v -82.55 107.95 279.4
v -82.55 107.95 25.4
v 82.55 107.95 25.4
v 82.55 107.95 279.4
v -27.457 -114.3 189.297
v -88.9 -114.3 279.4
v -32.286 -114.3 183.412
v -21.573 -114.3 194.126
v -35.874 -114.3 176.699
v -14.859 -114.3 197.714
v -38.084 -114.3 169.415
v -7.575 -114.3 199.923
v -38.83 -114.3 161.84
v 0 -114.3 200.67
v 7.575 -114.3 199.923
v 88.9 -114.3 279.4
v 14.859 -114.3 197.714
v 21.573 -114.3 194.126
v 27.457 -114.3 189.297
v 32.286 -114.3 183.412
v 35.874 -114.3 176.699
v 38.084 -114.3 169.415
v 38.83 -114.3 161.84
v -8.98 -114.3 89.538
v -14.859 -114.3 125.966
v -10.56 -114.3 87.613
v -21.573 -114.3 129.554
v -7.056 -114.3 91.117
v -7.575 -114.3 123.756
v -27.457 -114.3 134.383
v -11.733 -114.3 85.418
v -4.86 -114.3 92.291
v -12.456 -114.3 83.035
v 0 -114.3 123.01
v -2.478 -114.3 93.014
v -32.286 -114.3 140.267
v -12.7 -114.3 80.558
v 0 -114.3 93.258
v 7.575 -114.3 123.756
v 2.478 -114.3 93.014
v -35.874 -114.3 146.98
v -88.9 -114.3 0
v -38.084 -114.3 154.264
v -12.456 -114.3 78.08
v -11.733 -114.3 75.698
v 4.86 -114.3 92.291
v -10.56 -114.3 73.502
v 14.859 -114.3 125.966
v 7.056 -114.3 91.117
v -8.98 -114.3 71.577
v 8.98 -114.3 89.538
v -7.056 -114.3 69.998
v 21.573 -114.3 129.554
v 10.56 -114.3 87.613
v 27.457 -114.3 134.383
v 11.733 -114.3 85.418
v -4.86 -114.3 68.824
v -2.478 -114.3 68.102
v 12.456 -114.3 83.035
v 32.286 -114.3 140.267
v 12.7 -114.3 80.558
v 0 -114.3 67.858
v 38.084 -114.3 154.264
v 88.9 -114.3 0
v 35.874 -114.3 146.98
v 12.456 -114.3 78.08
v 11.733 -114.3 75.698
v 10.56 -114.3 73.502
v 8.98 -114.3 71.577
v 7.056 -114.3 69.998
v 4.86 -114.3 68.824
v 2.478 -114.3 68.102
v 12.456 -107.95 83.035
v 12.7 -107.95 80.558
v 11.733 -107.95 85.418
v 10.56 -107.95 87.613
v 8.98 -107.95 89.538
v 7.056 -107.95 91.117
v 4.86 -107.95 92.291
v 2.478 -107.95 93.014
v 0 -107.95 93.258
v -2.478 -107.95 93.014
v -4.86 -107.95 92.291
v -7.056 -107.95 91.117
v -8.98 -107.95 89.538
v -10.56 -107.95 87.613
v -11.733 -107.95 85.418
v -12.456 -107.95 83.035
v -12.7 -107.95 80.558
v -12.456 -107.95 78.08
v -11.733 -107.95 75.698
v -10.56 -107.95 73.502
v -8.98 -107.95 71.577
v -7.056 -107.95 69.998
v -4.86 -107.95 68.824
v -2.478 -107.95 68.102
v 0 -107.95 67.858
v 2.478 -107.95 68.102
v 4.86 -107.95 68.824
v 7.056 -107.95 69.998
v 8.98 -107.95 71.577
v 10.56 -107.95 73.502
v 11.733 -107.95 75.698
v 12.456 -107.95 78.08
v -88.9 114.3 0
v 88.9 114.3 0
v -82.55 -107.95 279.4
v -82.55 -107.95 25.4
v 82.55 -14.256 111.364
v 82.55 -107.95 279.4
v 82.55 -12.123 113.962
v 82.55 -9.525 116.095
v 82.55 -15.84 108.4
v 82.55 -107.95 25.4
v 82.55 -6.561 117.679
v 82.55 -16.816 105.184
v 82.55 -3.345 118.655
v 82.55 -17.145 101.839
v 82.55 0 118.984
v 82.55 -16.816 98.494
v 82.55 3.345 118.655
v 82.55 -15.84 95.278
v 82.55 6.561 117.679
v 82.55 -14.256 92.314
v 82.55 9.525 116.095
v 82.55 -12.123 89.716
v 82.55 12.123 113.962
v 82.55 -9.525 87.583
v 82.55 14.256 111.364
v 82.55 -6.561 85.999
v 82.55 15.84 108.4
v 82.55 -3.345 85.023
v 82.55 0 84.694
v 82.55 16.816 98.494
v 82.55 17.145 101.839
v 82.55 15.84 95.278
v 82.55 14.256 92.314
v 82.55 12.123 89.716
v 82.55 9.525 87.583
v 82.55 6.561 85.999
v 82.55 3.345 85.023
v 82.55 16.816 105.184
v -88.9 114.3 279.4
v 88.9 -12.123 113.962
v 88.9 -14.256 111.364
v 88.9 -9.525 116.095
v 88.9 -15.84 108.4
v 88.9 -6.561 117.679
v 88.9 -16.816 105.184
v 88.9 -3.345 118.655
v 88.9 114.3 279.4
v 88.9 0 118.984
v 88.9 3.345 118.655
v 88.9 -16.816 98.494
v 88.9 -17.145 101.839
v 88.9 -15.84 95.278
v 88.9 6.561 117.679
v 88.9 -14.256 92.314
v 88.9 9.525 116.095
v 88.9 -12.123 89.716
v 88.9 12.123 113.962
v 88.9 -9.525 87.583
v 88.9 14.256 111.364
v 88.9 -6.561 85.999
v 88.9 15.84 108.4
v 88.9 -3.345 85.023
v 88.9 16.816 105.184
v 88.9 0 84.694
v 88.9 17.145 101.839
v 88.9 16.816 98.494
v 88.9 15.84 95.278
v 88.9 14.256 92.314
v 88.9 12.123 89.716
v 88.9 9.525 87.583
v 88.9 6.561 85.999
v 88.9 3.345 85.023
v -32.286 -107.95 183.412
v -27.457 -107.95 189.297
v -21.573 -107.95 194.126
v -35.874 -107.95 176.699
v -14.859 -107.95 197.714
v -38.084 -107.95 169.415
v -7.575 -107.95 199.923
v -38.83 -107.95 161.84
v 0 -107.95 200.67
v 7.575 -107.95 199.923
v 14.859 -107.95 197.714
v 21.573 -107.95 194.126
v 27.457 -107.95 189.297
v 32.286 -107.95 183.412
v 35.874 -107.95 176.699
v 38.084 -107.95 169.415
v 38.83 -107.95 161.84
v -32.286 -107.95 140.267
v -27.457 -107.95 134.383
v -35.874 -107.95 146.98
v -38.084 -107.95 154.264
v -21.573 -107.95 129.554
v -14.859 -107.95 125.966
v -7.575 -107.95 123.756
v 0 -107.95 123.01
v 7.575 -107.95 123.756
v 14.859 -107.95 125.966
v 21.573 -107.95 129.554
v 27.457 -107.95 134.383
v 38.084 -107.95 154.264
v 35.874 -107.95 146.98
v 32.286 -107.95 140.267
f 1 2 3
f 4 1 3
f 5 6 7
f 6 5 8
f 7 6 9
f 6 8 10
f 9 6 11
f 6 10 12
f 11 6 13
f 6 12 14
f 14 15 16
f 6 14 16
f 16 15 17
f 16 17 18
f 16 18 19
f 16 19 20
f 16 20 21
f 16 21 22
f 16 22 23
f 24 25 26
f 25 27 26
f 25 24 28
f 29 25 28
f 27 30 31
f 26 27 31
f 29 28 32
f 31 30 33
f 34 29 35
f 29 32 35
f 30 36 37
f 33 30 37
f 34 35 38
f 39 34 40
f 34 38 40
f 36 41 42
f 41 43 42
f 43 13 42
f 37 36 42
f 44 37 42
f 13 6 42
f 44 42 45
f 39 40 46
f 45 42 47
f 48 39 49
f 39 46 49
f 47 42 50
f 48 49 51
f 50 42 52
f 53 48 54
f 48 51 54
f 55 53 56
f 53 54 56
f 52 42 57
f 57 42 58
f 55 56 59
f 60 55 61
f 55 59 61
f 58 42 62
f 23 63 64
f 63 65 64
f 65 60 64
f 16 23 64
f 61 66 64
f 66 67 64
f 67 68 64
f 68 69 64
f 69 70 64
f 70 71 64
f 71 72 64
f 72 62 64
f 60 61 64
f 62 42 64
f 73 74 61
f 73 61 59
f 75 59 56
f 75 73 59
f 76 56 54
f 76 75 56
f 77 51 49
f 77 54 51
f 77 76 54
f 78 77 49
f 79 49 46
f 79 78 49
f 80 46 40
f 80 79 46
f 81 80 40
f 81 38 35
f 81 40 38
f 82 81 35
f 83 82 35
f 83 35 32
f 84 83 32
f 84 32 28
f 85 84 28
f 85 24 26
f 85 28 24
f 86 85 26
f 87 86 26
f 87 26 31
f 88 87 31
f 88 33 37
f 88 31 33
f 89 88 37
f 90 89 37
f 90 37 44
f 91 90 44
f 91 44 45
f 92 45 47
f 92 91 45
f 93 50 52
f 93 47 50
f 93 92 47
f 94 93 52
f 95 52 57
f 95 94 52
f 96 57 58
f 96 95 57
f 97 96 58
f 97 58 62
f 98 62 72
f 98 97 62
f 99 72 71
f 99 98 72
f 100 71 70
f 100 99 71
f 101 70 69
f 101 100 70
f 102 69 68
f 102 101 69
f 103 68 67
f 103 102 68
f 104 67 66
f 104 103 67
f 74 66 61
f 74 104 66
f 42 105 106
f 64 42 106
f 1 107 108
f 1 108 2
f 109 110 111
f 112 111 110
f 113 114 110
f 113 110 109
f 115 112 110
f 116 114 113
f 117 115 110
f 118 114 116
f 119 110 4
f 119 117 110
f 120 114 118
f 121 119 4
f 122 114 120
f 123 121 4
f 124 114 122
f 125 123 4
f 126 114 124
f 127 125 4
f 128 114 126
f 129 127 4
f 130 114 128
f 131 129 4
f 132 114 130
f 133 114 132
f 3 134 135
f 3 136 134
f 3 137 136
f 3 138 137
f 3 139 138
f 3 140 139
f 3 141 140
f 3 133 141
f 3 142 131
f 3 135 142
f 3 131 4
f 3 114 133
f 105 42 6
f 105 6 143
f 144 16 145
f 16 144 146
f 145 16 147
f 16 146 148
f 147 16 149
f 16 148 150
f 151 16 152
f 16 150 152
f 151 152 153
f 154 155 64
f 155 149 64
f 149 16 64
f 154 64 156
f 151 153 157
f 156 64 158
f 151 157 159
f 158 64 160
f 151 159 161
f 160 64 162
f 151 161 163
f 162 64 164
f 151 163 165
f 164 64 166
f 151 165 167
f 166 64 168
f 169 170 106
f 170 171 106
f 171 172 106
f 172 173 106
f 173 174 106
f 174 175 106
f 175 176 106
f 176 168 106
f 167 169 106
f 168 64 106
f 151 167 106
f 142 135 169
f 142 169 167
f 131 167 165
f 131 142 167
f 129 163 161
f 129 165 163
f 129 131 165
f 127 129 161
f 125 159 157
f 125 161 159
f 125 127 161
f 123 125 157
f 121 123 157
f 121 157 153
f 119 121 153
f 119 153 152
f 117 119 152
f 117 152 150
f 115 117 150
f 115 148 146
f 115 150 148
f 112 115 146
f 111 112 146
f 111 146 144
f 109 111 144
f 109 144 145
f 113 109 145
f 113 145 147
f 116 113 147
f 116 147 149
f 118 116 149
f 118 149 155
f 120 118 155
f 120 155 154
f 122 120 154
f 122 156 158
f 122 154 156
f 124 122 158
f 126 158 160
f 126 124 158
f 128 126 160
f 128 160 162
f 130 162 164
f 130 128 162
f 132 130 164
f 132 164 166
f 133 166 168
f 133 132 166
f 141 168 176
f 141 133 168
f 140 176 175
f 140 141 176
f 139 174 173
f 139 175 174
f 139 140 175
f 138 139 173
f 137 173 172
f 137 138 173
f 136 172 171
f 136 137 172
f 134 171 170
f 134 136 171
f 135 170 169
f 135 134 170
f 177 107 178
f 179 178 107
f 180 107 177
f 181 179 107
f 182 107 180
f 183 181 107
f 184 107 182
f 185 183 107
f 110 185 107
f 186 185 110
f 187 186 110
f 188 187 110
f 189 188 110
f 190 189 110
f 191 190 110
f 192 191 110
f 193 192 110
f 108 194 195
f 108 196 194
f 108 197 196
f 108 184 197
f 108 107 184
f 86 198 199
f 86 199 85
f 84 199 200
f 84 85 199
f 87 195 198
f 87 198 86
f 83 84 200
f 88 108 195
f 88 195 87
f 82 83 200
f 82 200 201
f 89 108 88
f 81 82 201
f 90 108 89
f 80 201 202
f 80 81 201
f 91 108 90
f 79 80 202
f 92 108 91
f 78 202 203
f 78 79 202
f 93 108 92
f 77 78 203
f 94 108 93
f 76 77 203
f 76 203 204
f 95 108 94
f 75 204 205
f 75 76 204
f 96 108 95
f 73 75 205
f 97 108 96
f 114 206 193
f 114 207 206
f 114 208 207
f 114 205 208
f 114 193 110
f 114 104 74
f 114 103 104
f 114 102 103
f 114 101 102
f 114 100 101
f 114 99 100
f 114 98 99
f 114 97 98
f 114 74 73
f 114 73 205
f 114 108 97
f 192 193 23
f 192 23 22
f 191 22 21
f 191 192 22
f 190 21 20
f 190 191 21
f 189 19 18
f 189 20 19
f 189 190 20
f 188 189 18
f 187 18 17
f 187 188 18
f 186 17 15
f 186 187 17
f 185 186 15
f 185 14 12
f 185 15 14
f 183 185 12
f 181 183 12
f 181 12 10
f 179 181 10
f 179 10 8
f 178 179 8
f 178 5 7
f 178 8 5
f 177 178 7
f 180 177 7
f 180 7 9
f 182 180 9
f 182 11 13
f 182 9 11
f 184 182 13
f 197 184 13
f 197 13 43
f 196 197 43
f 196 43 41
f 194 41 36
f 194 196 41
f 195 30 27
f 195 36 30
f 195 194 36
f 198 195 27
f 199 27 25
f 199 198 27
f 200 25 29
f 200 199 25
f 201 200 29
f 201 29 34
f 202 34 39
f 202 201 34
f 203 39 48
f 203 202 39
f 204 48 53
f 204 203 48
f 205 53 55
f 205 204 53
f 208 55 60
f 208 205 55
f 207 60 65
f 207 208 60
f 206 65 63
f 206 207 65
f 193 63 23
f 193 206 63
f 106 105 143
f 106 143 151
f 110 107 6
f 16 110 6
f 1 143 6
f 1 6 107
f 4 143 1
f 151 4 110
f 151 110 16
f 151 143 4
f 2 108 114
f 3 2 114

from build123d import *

# Parameters (mm, degrees)
F0_W     = 177.8
F0_H     = 228.6
F0_W_2   = 165.1
F0_H_2   = 215.9
F1_DEPTH = 279.4
F2_R     = 12.7
F2_R_2   = 38.829729
F3_DEPTH = 254
F4_R     = 17.145
F5_DEPTH = 254
F6_DEPTH = 25.4


with BuildPart() as f1:
    # F0 (on Top) → F1 (new body)
    with BuildSketch(Plane.XY):
        Rectangle(F0_W, F0_H)
        Rectangle(F0_W_2, F0_H_2, mode=Mode.SUBTRACT)
    extrude(amount=F1_DEPTH)

    # F2 (on Front) → F3 (cut)
    with BuildSketch(Plane.XZ):
        with Locations((0, 80.557629)):
            Circle(F2_R)
        with Locations((0, 161.839798)):
            Circle(F2_R_2)
    extrude(amount=F3_DEPTH, mode=Mode.SUBTRACT)

    # F4 (on Right) → F5 (cut)
    with BuildSketch(Plane.YZ):
        with Locations((0, 101.838969)):
            Circle(F4_R)
    extrude(amount=F5_DEPTH, mode=Mode.SUBTRACT)

    # F0 (on Top) → F6 (join)
    with BuildSketch(Plane.XY):
        Rectangle(F0_W_2, F0_H_2)
    extrude(amount=F6_DEPTH)


solid = f1.part
